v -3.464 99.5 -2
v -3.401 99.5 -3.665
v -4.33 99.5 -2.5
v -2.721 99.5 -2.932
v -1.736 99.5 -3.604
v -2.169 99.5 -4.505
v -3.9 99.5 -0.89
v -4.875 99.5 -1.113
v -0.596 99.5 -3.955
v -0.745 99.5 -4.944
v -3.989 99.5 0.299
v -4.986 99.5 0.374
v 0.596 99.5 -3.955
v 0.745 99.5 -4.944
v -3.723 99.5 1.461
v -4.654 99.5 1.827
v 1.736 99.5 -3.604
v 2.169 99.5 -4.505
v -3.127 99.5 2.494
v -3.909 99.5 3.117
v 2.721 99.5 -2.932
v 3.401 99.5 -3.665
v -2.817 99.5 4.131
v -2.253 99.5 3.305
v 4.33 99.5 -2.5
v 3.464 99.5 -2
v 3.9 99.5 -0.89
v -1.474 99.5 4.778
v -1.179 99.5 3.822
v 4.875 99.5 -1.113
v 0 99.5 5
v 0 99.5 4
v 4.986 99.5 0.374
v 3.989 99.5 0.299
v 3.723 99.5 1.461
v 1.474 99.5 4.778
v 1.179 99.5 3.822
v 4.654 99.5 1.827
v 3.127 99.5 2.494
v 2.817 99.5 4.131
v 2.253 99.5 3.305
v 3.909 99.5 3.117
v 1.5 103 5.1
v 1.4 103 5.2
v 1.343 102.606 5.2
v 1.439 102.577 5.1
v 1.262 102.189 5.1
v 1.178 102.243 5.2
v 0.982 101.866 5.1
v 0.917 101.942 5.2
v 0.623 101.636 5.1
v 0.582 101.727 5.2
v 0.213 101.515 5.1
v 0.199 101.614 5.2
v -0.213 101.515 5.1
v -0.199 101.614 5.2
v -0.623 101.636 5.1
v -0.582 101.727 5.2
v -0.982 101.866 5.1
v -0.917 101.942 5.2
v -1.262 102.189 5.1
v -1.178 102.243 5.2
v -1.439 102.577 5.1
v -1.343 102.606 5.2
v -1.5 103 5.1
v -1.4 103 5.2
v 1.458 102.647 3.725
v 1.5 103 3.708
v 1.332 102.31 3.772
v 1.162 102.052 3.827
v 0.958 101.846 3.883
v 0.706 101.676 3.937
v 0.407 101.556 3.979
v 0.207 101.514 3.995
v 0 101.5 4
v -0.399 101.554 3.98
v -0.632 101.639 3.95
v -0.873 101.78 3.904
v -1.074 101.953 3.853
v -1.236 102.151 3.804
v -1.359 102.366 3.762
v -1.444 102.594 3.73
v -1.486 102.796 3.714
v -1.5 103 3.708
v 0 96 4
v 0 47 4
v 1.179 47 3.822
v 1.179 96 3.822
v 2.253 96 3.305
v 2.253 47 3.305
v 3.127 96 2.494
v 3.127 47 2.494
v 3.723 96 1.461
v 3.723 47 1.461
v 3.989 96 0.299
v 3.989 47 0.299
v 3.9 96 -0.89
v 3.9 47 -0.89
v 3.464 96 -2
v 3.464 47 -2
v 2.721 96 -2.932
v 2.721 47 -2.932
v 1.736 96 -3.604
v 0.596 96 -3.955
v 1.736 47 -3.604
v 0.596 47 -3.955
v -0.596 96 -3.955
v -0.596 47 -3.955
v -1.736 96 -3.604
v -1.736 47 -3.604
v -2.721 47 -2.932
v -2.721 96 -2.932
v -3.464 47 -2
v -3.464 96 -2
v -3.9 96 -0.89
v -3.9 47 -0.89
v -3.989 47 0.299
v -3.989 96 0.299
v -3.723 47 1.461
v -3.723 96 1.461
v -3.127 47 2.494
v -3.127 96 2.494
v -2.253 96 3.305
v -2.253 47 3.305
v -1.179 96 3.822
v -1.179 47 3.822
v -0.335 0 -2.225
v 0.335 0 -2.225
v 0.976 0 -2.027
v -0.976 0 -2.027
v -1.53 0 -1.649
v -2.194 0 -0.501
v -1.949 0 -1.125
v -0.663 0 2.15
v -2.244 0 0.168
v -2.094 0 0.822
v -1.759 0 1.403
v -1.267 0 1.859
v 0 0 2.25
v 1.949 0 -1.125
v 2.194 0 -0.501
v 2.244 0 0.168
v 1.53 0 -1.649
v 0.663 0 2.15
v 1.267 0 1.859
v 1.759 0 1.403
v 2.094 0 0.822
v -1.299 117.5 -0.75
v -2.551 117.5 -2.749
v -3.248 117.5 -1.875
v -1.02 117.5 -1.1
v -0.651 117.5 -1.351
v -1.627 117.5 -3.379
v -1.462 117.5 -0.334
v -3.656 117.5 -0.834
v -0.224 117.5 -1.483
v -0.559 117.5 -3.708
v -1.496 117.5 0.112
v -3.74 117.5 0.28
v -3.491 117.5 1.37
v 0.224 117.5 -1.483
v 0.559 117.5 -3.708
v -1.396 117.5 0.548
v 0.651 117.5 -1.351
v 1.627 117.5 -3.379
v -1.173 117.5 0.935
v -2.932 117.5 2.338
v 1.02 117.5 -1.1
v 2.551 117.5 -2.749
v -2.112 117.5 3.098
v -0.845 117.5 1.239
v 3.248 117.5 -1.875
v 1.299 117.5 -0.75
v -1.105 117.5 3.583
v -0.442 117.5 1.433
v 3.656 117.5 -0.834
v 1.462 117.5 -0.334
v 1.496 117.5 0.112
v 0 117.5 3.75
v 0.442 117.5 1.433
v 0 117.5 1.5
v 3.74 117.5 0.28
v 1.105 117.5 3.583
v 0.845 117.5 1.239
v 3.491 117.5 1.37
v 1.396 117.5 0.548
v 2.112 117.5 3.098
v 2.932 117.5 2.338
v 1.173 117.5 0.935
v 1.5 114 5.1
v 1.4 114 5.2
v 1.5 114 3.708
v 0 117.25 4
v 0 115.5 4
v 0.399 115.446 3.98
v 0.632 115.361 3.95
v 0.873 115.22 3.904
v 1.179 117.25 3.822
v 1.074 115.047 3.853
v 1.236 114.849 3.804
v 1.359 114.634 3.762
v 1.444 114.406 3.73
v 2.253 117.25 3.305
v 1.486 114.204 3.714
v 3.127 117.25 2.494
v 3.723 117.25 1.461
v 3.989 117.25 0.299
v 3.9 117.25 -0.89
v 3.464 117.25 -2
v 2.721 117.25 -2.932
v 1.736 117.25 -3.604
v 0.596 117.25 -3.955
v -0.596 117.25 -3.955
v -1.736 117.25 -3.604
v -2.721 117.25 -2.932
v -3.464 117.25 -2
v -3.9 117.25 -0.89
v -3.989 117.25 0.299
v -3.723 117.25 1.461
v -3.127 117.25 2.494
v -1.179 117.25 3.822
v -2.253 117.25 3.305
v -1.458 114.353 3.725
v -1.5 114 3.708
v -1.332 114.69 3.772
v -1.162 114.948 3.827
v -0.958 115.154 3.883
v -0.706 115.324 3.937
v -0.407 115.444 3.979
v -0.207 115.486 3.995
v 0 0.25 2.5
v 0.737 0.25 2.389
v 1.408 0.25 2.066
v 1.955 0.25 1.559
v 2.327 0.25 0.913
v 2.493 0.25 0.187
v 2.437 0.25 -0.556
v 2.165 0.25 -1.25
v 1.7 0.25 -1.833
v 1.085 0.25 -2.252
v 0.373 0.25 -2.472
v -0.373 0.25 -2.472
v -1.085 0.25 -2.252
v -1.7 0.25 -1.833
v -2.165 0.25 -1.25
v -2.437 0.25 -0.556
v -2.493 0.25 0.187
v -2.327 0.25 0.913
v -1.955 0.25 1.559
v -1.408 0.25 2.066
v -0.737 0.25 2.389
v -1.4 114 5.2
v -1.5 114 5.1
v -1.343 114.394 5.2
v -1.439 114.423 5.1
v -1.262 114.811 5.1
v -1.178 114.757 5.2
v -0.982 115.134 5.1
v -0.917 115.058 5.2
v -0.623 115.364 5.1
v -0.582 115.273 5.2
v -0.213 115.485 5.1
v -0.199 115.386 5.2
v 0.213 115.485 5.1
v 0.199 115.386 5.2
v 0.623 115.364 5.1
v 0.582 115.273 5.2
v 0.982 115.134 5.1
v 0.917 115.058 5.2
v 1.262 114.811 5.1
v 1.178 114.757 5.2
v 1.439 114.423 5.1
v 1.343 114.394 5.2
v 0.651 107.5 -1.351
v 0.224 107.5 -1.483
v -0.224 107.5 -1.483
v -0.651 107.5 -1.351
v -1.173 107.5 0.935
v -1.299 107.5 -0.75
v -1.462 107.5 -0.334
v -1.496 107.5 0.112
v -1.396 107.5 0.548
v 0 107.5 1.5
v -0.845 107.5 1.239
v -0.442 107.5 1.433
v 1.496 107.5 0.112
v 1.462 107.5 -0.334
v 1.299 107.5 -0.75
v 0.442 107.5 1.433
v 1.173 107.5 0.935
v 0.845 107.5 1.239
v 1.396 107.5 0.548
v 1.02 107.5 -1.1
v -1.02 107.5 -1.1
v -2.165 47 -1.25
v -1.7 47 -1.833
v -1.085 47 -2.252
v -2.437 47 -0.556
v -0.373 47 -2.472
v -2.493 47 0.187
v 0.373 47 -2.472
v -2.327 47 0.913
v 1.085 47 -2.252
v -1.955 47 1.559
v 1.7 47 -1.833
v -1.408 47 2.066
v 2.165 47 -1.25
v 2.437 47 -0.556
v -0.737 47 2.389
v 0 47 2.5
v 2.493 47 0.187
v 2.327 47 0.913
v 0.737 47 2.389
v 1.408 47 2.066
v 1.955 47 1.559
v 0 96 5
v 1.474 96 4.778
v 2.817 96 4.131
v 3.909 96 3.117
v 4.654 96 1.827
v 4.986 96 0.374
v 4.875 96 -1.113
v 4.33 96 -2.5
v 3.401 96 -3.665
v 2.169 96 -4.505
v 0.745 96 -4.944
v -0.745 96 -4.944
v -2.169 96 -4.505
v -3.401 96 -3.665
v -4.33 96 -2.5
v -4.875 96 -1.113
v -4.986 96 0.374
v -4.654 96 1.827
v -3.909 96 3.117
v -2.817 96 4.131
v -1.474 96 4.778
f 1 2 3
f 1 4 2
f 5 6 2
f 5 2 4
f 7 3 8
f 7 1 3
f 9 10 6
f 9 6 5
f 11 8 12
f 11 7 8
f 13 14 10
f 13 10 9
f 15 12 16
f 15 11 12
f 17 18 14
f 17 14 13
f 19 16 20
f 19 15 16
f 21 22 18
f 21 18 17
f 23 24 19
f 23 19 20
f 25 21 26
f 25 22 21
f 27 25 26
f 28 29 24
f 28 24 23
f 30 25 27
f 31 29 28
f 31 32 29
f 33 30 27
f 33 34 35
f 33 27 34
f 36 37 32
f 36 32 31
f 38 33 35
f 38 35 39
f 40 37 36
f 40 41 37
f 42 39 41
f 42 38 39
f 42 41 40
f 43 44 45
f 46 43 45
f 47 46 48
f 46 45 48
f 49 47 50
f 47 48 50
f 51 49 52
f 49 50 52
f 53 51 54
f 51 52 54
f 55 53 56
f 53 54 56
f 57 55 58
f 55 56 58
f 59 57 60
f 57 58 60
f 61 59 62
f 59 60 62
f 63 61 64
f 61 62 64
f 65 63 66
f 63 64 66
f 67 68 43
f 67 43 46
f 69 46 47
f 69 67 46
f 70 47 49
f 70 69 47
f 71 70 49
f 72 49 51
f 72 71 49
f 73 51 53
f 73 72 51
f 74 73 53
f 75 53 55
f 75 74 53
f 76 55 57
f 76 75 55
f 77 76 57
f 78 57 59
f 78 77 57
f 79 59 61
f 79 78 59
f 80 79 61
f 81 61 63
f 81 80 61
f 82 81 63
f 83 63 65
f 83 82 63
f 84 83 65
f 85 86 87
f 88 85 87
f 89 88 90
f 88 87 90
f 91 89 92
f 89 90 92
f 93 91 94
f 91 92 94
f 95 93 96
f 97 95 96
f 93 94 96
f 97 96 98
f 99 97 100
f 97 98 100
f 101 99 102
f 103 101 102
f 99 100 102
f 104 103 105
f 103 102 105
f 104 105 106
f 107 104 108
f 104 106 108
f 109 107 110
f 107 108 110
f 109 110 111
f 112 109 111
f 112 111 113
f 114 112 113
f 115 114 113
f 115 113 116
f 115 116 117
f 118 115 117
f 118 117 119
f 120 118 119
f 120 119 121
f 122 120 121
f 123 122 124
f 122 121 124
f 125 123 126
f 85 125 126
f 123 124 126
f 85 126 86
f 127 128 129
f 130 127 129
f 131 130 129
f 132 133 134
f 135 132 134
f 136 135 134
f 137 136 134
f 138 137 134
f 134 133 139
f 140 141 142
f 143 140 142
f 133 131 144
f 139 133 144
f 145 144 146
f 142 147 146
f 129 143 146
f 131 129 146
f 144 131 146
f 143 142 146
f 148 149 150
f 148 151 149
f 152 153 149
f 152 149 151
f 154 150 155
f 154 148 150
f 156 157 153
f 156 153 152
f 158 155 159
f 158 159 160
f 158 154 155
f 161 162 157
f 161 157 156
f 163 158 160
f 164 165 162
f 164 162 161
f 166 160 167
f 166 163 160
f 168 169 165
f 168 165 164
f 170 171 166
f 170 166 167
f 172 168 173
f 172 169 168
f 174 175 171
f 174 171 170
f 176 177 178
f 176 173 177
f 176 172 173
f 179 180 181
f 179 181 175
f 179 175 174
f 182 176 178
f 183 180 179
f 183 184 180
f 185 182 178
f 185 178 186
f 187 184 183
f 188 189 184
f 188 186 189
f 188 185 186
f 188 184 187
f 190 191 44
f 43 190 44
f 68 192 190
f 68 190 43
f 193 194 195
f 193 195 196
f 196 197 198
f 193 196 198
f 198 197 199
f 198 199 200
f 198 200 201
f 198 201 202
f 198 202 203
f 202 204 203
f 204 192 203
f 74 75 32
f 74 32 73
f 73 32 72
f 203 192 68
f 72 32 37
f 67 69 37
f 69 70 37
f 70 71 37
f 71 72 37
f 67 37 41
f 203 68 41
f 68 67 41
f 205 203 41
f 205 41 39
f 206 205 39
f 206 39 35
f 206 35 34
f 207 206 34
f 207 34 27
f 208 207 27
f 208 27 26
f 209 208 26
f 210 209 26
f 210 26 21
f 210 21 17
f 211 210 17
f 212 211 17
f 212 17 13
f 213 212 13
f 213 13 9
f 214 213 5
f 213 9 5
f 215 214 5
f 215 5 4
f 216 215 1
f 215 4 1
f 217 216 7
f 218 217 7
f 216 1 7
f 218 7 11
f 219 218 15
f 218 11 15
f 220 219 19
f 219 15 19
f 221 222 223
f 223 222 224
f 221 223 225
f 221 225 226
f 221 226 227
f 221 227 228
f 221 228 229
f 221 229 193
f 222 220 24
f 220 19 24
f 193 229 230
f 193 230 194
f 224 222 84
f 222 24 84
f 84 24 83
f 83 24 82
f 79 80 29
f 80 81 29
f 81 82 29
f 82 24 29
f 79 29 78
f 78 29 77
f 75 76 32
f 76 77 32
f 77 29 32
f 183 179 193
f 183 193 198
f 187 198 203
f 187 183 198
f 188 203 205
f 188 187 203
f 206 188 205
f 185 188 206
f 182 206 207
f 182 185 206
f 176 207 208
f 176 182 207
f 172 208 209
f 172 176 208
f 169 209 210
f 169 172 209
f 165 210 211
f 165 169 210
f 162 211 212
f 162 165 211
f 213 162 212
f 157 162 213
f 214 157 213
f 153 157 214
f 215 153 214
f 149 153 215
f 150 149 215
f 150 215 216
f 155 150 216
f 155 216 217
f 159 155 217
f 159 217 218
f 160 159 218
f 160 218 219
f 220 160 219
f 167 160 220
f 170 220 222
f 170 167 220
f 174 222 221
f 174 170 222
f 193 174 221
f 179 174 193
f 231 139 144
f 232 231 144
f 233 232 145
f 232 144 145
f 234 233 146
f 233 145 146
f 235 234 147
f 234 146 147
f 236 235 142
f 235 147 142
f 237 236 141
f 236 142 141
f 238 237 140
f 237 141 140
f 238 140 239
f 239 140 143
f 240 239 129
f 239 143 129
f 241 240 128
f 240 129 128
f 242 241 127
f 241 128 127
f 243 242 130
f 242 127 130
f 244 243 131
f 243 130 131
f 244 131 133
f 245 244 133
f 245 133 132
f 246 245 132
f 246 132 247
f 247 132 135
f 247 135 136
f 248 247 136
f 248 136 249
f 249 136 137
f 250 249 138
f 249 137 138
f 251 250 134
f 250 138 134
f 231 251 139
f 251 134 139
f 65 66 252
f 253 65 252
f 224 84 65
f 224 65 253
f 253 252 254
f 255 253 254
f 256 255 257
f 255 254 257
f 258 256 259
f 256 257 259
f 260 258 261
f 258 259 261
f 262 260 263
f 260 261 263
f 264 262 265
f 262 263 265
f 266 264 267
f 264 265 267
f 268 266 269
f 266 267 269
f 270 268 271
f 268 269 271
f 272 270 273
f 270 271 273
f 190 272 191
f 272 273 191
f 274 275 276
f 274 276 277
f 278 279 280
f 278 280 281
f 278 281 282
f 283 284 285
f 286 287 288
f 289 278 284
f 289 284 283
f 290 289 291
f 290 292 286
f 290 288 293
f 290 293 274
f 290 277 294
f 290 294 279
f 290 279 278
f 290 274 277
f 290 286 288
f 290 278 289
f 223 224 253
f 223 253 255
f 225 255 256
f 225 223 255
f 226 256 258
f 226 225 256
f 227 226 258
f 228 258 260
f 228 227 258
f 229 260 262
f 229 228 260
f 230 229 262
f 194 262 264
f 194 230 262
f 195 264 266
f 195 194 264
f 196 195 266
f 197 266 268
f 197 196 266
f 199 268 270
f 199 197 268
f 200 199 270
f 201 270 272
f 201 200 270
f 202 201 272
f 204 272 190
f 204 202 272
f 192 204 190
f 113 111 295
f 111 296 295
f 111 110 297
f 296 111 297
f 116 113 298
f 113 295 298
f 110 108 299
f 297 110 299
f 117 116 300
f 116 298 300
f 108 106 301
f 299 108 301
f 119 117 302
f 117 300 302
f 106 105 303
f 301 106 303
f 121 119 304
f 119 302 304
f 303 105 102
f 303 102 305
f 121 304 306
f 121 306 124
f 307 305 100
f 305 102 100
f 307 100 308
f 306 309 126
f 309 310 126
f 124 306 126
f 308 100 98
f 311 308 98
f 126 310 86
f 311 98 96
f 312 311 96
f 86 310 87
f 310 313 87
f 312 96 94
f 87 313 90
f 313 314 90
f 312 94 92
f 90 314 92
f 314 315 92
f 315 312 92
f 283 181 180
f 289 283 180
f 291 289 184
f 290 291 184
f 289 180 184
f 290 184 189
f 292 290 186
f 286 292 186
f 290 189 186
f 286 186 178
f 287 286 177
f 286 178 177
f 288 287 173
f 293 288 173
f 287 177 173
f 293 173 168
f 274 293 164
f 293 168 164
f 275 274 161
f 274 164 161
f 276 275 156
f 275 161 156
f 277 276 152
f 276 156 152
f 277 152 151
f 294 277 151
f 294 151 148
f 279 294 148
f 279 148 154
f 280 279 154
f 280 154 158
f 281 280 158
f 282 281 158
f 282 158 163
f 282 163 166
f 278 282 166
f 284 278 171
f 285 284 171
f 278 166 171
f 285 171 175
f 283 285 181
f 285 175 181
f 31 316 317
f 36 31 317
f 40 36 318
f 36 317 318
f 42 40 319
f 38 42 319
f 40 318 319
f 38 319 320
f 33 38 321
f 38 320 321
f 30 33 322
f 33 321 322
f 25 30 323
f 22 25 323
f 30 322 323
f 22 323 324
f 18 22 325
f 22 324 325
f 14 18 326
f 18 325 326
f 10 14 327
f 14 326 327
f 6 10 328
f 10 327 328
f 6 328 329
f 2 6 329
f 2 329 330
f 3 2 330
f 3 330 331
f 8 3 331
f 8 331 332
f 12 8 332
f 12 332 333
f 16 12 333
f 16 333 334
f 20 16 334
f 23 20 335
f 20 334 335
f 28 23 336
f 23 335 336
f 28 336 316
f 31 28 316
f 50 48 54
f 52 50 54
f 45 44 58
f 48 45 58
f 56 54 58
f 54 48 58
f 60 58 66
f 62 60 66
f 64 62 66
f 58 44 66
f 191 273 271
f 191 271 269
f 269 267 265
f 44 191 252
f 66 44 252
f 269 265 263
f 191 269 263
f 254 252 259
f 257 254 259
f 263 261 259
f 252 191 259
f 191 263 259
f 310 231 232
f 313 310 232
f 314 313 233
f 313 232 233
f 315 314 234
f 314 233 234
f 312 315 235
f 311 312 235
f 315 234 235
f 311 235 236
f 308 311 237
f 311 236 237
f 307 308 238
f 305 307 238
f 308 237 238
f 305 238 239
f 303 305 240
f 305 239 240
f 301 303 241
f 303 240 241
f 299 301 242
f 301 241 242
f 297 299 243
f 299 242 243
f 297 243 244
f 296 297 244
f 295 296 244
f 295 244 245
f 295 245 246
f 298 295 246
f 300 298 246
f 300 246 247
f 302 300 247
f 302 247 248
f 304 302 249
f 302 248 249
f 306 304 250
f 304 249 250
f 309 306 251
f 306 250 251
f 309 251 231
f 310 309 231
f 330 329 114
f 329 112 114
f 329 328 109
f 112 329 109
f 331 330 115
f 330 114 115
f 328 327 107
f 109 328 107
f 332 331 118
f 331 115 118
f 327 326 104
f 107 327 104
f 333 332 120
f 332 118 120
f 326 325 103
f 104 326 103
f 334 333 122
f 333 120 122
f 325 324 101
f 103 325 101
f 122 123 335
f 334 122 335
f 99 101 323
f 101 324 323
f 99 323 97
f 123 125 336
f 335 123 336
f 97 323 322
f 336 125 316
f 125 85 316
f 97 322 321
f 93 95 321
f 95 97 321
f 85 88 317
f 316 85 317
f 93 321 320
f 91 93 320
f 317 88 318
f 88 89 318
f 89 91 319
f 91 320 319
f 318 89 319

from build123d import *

# Parameters (mm, degrees)
SKETCH_1_R          = 2.5
EXTRUDE_1_DEPTH     = 47
EXTRUDE_START       = 47
SKETCH_2_R          = 4
EXTRUDE_2_DEPTH     = 49
EXTRUDE_START_2     = 96
SKETCH_3_R          = 5
EXTRUDE_3_DEPTH     = 3.5
EXTRUDE_START_3     = 99.5
SKETCH_4_R          = 4
EXTRUDE_4_DEPTH     = 18
EXTRUDE_START_4     = 2.2
EXTRUDE_5_DEPTH     = 3
CHAMFER_1_SIZE      = 0.25
CHAMFER_2_SIZE      = 0.1
CUT_EXTRUDE_START   = 117.5
SKETCH_6_R          = 1.5
CUT_EXTRUDE_1_DEPTH = 10


with BuildPart() as part:
    # 草图1 → 凸台-拉伸1 (new body)
    with BuildSketch(Plane(origin=(0, 0, 0), x_dir=(1, 0, 0), z_dir=(0, 1, 0))):
        with Locations(Location((0, 0, 0), (0, 0, 270))):
            Circle(SKETCH_1_R)
    extrude(amount=EXTRUDE_1_DEPTH)

    # 草图2 → 凸台-拉伸2 (add)
    with BuildSketch(Plane(origin=(0, 0, 0), x_dir=(1, 0, 0), z_dir=(0, 1, 0)).offset(EXTRUDE_START)):
        with Locations(Location((0, 0, 0), (0, 0, 270))):
            Circle(SKETCH_2_R)
    extrude(amount=EXTRUDE_2_DEPTH)

    # 草图3 → 凸台-拉伸3 (add)
    with BuildSketch(Plane(origin=(0, 0, 0), x_dir=(1, 0, 0), z_dir=(0, 1, 0)).offset(EXTRUDE_START_2)):
        with Locations(Location((0, 0, 0), (0, 0, 270))):
            Circle(SKETCH_3_R)
    extrude(amount=EXTRUDE_3_DEPTH)

    # 草图4 → 凸台-拉伸4 (add)
    with BuildSketch(Plane(origin=(0, 0, 0), x_dir=(1, 0, 0), z_dir=(0, 1, 0)).offset(EXTRUDE_START_3)):
        with Locations(Location((0, 0, 0), (0, 0, 270))):
            Circle(SKETCH_4_R)
    extrude(amount=EXTRUDE_4_DEPTH)

    # 草图11 → 凸台-拉伸5 (add)
    with BuildSketch(Plane.XY.offset(EXTRUDE_START_4)):
        with BuildLine():
            Line((-1.5, 103), (-1.5, 114))
            ThreePointArc((-1.5, 114), (0, 115.5), (1.5, 114))
            Line((1.5, 114), (1.5, 103))
            ThreePointArc((1.5, 103), (0, 101.5), (-1.5, 103))
        make_face()
    extrude(amount=EXTRUDE_5_DEPTH)

    # 倒角1
    chamfer_1_edges = [part.edges().sort_by_distance(p)[0] for p in [
        (0, 117.5, -4),
        (0, 0, -2.5),
    ]]
    chamfer(chamfer_1_edges, length=CHAMFER_1_SIZE)

    # 倒角2
    chamfer_2_edges = [part.edges().sort_by_distance(p)[0] for p in [
        (0, 101.5, 5.2),
        (1.5, 108.5, 5.2),
        (0, 115.5, 5.2),
        (-1.5, 108.5, 5.2),
    ]]
    chamfer(chamfer_2_edges, length=CHAMFER_2_SIZE)

    # 草图6 → 切除-拉伸1 (cut)
    with BuildSketch(Plane(origin=(0, 0, 0), x_dir=(1, 0, 0), z_dir=(0, 1, 0)).offset(CUT_EXTRUDE_START)):
        with Locations(Location((0, 0, 0), (0, 0, 270))):
            Circle(SKETCH_6_R)
    extrude(amount=-CUT_EXTRUDE_1_DEPTH, mode=Mode.SUBTRACT)


solid = part.part
